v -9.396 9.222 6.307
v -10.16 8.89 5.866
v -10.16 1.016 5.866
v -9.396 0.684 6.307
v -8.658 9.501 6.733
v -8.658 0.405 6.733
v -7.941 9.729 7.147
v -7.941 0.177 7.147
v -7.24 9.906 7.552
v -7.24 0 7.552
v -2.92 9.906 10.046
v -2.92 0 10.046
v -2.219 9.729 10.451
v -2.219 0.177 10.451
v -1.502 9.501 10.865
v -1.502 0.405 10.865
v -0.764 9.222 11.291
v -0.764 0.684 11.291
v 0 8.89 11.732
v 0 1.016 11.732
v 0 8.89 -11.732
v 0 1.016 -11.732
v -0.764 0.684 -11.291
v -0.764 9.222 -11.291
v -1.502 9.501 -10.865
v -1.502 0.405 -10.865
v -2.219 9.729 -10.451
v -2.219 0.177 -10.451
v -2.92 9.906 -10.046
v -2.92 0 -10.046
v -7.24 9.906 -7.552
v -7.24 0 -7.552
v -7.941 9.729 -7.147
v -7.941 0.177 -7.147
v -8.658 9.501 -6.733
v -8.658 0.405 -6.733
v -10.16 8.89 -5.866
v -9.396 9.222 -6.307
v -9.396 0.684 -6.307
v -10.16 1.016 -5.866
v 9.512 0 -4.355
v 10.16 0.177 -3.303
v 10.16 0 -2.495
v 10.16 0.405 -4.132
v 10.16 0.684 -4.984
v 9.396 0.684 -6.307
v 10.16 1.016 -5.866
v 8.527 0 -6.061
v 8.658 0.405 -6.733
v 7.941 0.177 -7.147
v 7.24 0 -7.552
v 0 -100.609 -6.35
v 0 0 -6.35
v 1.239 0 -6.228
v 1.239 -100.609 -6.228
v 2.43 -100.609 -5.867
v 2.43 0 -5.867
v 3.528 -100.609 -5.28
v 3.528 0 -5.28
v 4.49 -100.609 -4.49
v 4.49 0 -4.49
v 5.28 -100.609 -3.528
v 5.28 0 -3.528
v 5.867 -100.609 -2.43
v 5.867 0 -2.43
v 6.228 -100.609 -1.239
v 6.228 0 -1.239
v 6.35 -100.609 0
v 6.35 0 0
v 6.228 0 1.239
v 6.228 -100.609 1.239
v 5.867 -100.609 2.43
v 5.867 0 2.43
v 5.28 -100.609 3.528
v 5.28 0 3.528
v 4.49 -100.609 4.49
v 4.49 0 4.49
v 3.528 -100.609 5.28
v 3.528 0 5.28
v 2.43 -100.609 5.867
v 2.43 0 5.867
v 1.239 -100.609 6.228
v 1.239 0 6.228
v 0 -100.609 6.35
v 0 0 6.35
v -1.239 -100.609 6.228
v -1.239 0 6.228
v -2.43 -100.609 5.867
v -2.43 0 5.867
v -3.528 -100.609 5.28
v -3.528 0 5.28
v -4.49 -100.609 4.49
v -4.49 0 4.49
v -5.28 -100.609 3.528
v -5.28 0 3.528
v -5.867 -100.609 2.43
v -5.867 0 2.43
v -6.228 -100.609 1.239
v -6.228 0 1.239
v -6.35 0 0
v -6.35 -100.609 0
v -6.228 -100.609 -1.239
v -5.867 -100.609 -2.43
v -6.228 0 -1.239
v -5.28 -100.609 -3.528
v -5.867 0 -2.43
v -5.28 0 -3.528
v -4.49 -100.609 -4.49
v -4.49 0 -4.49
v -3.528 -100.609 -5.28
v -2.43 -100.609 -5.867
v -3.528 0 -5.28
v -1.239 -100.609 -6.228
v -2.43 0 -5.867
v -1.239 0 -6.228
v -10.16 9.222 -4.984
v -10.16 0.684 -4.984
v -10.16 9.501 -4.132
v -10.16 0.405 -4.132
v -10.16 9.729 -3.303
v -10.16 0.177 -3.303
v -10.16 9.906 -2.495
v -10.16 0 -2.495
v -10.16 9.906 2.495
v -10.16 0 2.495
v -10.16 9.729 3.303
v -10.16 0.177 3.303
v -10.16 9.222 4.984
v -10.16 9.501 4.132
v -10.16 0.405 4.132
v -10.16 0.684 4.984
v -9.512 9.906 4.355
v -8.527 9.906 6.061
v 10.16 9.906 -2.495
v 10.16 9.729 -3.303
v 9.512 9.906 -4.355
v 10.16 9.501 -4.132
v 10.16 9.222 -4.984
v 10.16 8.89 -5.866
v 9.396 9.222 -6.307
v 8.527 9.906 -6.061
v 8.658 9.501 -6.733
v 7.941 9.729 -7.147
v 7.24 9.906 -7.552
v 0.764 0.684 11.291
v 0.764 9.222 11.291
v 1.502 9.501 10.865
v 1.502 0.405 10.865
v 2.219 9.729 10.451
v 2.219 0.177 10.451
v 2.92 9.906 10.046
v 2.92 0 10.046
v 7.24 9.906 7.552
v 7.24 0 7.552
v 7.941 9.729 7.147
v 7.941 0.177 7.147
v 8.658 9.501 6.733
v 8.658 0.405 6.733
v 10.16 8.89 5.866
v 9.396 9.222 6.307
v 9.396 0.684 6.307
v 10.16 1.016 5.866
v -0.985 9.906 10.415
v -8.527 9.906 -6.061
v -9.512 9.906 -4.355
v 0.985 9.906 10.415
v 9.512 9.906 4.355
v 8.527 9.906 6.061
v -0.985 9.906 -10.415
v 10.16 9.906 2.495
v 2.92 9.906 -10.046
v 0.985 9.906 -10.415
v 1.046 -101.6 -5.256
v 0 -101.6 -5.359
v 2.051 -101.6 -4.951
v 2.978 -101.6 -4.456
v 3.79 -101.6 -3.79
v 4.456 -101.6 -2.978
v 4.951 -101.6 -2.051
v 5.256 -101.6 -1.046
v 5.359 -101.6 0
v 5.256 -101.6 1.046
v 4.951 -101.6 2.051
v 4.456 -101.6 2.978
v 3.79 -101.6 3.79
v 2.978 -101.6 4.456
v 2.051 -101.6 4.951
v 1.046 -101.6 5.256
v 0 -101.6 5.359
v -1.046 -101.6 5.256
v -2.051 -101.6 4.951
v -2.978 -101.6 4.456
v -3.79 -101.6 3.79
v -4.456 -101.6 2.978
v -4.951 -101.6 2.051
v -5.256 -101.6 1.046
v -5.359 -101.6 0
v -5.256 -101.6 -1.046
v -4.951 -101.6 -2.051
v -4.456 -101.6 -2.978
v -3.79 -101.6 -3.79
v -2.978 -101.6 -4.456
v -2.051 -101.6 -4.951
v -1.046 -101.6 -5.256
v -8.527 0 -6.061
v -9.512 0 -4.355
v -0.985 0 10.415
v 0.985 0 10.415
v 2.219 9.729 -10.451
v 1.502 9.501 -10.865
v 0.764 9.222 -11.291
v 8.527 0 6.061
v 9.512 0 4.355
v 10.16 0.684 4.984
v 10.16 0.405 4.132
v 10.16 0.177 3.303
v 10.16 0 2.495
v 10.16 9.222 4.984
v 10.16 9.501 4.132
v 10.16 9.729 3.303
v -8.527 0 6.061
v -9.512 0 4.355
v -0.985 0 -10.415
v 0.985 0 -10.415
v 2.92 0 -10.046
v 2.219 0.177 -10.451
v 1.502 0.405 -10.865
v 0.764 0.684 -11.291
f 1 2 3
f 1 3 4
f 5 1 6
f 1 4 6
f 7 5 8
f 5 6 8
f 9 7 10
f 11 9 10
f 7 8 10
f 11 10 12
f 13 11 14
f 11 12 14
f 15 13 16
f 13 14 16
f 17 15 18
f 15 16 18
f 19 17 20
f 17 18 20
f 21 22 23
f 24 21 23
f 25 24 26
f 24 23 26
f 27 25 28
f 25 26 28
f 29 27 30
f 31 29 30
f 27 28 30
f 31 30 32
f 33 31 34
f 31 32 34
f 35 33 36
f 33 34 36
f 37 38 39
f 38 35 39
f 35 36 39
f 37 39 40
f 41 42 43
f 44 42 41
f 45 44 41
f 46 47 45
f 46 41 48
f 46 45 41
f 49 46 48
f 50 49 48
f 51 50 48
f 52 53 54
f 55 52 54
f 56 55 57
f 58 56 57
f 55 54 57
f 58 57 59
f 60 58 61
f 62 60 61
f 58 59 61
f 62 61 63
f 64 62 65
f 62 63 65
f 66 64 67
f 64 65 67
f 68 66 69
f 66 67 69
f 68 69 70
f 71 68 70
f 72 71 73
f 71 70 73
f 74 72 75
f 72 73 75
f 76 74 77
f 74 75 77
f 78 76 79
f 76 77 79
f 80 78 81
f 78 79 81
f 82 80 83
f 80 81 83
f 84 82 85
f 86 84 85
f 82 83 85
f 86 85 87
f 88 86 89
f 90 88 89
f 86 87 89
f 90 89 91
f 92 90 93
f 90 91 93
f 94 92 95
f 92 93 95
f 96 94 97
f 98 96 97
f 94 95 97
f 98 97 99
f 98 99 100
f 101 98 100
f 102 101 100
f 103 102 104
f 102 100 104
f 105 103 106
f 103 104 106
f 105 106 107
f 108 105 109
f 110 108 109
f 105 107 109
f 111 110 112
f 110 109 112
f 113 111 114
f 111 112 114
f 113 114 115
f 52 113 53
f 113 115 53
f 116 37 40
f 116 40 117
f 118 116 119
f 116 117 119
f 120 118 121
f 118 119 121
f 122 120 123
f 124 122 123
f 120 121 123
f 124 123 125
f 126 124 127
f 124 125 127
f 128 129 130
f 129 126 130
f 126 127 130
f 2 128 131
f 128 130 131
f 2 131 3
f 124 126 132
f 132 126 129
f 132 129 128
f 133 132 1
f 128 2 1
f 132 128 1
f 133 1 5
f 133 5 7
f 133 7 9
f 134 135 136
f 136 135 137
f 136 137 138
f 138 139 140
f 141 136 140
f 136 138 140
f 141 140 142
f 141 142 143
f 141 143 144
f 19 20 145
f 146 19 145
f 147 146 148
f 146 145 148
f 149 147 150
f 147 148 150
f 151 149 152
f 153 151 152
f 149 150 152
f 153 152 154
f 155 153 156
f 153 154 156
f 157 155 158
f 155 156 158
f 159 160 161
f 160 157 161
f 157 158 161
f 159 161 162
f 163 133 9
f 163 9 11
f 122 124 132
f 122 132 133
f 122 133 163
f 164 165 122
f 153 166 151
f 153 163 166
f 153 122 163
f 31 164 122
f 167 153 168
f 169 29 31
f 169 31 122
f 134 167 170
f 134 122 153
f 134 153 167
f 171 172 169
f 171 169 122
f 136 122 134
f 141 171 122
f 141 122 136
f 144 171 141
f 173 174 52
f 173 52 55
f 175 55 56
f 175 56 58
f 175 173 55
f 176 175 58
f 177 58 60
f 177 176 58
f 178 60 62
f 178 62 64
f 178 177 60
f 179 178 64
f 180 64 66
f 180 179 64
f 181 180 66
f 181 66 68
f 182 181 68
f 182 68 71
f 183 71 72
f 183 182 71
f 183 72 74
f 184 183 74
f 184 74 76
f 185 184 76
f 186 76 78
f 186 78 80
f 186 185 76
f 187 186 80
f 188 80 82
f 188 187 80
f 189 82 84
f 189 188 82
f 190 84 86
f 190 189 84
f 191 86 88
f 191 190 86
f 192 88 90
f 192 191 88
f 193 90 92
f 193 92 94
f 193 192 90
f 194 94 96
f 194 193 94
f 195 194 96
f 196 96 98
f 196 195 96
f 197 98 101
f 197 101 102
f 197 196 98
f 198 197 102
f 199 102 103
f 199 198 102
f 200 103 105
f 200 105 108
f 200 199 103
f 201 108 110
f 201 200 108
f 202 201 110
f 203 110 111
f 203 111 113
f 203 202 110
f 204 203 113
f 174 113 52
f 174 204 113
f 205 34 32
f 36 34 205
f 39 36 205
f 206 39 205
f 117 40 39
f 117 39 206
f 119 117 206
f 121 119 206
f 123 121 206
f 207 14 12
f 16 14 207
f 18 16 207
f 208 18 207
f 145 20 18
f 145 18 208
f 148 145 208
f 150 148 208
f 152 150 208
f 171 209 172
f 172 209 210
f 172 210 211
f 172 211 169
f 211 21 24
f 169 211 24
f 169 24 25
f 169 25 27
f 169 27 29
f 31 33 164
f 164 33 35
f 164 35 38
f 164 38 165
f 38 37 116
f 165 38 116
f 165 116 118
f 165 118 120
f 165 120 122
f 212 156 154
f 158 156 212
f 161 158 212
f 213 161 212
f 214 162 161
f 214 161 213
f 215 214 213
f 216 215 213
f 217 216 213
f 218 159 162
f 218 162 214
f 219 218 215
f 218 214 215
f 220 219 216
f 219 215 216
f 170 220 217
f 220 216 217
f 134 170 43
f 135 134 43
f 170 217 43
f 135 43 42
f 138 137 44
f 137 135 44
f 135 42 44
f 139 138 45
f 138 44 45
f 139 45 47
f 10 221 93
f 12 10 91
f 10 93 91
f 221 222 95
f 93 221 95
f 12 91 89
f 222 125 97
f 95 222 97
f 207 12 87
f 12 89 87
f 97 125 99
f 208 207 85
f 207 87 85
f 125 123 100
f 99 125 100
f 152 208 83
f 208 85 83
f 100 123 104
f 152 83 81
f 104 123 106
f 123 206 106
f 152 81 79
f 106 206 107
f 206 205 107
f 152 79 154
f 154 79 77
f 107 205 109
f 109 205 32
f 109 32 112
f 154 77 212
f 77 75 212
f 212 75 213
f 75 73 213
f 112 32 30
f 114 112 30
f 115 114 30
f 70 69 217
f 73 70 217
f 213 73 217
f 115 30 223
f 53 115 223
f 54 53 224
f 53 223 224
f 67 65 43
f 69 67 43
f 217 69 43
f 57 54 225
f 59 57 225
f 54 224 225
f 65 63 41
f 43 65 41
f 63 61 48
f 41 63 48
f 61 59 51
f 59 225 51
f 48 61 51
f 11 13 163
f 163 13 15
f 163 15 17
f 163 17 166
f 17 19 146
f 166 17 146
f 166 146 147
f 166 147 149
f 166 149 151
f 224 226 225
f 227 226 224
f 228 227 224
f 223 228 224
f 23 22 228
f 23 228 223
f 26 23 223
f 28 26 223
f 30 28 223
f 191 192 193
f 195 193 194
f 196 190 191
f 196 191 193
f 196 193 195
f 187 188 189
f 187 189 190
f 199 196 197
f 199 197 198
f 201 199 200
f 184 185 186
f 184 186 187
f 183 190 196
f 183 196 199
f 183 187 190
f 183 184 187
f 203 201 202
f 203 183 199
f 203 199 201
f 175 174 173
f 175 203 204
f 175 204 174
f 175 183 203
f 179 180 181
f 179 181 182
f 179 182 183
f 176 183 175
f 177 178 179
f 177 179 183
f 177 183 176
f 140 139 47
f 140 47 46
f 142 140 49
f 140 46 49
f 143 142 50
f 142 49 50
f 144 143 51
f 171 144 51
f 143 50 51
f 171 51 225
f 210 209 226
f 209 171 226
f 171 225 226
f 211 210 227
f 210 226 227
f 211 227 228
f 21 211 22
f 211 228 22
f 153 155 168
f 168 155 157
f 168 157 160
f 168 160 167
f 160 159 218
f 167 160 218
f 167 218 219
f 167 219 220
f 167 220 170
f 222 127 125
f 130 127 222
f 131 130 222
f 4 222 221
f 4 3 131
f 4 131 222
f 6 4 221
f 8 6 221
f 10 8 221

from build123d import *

# Parameters (mm, degrees)
BOSS_EXTRUDE1_DEPTH = 9.906
SKETCH3_R           = 6.35
BOSS_EXTRUDE2_DEPTH = 101.6
CHAMFER1_SIZE       = 0.9906


with BuildPart() as part:
    # Sketch1 → Boss-Extrude1 (new body)
    with BuildSketch(Plane(origin=(0, 0, 0), x_dir=(1, 0, 0), z_dir=(0, 1, 0))):
        Polygon((0, -11.73175747), (10.16, -5.865878735), (10.16, 5.865878735), (0, 11.73175747), (-10.16, 5.865878735), (-10.16, -5.865878735), align=None)
    extrude(amount=BOSS_EXTRUDE1_DEPTH)

    # Sketch3 → Boss-Extrude2 (add)
    with BuildSketch(Plane.XZ):
        with Locations(Location((0, 0, 0), (0, 0, 270))):
            Circle(SKETCH3_R)
    extrude(amount=BOSS_EXTRUDE2_DEPTH)

    # Chamfer1
    chamfer1_edges = [part.edges().sort_by_distance(p)[0] for p in [
        (0, -101.6, 6.35),
    ]]
    chamfer(chamfer1_edges, length=CHAMFER1_SIZE)

    # Sketch9 → Cut-Revolve4 (revolve, cut)
    with BuildSketch(Plane(origin=(0, 0, 0), x_dir=(0, 0, -1), z_dir=(1, 0, 0))):
        Polygon((-11.73175747, 9.906), (-10.46175747, 9.906), (-11.73175747, 8.89), align=None)
        Polygon((-11.73175747, 0), (-10.46175747, 0), (-11.73175747, 1.016), align=None)
    revolve(axis=Axis((0, 0, 0), (0, 1, 0)), mode=Mode.SUBTRACT)


solid = part.part
